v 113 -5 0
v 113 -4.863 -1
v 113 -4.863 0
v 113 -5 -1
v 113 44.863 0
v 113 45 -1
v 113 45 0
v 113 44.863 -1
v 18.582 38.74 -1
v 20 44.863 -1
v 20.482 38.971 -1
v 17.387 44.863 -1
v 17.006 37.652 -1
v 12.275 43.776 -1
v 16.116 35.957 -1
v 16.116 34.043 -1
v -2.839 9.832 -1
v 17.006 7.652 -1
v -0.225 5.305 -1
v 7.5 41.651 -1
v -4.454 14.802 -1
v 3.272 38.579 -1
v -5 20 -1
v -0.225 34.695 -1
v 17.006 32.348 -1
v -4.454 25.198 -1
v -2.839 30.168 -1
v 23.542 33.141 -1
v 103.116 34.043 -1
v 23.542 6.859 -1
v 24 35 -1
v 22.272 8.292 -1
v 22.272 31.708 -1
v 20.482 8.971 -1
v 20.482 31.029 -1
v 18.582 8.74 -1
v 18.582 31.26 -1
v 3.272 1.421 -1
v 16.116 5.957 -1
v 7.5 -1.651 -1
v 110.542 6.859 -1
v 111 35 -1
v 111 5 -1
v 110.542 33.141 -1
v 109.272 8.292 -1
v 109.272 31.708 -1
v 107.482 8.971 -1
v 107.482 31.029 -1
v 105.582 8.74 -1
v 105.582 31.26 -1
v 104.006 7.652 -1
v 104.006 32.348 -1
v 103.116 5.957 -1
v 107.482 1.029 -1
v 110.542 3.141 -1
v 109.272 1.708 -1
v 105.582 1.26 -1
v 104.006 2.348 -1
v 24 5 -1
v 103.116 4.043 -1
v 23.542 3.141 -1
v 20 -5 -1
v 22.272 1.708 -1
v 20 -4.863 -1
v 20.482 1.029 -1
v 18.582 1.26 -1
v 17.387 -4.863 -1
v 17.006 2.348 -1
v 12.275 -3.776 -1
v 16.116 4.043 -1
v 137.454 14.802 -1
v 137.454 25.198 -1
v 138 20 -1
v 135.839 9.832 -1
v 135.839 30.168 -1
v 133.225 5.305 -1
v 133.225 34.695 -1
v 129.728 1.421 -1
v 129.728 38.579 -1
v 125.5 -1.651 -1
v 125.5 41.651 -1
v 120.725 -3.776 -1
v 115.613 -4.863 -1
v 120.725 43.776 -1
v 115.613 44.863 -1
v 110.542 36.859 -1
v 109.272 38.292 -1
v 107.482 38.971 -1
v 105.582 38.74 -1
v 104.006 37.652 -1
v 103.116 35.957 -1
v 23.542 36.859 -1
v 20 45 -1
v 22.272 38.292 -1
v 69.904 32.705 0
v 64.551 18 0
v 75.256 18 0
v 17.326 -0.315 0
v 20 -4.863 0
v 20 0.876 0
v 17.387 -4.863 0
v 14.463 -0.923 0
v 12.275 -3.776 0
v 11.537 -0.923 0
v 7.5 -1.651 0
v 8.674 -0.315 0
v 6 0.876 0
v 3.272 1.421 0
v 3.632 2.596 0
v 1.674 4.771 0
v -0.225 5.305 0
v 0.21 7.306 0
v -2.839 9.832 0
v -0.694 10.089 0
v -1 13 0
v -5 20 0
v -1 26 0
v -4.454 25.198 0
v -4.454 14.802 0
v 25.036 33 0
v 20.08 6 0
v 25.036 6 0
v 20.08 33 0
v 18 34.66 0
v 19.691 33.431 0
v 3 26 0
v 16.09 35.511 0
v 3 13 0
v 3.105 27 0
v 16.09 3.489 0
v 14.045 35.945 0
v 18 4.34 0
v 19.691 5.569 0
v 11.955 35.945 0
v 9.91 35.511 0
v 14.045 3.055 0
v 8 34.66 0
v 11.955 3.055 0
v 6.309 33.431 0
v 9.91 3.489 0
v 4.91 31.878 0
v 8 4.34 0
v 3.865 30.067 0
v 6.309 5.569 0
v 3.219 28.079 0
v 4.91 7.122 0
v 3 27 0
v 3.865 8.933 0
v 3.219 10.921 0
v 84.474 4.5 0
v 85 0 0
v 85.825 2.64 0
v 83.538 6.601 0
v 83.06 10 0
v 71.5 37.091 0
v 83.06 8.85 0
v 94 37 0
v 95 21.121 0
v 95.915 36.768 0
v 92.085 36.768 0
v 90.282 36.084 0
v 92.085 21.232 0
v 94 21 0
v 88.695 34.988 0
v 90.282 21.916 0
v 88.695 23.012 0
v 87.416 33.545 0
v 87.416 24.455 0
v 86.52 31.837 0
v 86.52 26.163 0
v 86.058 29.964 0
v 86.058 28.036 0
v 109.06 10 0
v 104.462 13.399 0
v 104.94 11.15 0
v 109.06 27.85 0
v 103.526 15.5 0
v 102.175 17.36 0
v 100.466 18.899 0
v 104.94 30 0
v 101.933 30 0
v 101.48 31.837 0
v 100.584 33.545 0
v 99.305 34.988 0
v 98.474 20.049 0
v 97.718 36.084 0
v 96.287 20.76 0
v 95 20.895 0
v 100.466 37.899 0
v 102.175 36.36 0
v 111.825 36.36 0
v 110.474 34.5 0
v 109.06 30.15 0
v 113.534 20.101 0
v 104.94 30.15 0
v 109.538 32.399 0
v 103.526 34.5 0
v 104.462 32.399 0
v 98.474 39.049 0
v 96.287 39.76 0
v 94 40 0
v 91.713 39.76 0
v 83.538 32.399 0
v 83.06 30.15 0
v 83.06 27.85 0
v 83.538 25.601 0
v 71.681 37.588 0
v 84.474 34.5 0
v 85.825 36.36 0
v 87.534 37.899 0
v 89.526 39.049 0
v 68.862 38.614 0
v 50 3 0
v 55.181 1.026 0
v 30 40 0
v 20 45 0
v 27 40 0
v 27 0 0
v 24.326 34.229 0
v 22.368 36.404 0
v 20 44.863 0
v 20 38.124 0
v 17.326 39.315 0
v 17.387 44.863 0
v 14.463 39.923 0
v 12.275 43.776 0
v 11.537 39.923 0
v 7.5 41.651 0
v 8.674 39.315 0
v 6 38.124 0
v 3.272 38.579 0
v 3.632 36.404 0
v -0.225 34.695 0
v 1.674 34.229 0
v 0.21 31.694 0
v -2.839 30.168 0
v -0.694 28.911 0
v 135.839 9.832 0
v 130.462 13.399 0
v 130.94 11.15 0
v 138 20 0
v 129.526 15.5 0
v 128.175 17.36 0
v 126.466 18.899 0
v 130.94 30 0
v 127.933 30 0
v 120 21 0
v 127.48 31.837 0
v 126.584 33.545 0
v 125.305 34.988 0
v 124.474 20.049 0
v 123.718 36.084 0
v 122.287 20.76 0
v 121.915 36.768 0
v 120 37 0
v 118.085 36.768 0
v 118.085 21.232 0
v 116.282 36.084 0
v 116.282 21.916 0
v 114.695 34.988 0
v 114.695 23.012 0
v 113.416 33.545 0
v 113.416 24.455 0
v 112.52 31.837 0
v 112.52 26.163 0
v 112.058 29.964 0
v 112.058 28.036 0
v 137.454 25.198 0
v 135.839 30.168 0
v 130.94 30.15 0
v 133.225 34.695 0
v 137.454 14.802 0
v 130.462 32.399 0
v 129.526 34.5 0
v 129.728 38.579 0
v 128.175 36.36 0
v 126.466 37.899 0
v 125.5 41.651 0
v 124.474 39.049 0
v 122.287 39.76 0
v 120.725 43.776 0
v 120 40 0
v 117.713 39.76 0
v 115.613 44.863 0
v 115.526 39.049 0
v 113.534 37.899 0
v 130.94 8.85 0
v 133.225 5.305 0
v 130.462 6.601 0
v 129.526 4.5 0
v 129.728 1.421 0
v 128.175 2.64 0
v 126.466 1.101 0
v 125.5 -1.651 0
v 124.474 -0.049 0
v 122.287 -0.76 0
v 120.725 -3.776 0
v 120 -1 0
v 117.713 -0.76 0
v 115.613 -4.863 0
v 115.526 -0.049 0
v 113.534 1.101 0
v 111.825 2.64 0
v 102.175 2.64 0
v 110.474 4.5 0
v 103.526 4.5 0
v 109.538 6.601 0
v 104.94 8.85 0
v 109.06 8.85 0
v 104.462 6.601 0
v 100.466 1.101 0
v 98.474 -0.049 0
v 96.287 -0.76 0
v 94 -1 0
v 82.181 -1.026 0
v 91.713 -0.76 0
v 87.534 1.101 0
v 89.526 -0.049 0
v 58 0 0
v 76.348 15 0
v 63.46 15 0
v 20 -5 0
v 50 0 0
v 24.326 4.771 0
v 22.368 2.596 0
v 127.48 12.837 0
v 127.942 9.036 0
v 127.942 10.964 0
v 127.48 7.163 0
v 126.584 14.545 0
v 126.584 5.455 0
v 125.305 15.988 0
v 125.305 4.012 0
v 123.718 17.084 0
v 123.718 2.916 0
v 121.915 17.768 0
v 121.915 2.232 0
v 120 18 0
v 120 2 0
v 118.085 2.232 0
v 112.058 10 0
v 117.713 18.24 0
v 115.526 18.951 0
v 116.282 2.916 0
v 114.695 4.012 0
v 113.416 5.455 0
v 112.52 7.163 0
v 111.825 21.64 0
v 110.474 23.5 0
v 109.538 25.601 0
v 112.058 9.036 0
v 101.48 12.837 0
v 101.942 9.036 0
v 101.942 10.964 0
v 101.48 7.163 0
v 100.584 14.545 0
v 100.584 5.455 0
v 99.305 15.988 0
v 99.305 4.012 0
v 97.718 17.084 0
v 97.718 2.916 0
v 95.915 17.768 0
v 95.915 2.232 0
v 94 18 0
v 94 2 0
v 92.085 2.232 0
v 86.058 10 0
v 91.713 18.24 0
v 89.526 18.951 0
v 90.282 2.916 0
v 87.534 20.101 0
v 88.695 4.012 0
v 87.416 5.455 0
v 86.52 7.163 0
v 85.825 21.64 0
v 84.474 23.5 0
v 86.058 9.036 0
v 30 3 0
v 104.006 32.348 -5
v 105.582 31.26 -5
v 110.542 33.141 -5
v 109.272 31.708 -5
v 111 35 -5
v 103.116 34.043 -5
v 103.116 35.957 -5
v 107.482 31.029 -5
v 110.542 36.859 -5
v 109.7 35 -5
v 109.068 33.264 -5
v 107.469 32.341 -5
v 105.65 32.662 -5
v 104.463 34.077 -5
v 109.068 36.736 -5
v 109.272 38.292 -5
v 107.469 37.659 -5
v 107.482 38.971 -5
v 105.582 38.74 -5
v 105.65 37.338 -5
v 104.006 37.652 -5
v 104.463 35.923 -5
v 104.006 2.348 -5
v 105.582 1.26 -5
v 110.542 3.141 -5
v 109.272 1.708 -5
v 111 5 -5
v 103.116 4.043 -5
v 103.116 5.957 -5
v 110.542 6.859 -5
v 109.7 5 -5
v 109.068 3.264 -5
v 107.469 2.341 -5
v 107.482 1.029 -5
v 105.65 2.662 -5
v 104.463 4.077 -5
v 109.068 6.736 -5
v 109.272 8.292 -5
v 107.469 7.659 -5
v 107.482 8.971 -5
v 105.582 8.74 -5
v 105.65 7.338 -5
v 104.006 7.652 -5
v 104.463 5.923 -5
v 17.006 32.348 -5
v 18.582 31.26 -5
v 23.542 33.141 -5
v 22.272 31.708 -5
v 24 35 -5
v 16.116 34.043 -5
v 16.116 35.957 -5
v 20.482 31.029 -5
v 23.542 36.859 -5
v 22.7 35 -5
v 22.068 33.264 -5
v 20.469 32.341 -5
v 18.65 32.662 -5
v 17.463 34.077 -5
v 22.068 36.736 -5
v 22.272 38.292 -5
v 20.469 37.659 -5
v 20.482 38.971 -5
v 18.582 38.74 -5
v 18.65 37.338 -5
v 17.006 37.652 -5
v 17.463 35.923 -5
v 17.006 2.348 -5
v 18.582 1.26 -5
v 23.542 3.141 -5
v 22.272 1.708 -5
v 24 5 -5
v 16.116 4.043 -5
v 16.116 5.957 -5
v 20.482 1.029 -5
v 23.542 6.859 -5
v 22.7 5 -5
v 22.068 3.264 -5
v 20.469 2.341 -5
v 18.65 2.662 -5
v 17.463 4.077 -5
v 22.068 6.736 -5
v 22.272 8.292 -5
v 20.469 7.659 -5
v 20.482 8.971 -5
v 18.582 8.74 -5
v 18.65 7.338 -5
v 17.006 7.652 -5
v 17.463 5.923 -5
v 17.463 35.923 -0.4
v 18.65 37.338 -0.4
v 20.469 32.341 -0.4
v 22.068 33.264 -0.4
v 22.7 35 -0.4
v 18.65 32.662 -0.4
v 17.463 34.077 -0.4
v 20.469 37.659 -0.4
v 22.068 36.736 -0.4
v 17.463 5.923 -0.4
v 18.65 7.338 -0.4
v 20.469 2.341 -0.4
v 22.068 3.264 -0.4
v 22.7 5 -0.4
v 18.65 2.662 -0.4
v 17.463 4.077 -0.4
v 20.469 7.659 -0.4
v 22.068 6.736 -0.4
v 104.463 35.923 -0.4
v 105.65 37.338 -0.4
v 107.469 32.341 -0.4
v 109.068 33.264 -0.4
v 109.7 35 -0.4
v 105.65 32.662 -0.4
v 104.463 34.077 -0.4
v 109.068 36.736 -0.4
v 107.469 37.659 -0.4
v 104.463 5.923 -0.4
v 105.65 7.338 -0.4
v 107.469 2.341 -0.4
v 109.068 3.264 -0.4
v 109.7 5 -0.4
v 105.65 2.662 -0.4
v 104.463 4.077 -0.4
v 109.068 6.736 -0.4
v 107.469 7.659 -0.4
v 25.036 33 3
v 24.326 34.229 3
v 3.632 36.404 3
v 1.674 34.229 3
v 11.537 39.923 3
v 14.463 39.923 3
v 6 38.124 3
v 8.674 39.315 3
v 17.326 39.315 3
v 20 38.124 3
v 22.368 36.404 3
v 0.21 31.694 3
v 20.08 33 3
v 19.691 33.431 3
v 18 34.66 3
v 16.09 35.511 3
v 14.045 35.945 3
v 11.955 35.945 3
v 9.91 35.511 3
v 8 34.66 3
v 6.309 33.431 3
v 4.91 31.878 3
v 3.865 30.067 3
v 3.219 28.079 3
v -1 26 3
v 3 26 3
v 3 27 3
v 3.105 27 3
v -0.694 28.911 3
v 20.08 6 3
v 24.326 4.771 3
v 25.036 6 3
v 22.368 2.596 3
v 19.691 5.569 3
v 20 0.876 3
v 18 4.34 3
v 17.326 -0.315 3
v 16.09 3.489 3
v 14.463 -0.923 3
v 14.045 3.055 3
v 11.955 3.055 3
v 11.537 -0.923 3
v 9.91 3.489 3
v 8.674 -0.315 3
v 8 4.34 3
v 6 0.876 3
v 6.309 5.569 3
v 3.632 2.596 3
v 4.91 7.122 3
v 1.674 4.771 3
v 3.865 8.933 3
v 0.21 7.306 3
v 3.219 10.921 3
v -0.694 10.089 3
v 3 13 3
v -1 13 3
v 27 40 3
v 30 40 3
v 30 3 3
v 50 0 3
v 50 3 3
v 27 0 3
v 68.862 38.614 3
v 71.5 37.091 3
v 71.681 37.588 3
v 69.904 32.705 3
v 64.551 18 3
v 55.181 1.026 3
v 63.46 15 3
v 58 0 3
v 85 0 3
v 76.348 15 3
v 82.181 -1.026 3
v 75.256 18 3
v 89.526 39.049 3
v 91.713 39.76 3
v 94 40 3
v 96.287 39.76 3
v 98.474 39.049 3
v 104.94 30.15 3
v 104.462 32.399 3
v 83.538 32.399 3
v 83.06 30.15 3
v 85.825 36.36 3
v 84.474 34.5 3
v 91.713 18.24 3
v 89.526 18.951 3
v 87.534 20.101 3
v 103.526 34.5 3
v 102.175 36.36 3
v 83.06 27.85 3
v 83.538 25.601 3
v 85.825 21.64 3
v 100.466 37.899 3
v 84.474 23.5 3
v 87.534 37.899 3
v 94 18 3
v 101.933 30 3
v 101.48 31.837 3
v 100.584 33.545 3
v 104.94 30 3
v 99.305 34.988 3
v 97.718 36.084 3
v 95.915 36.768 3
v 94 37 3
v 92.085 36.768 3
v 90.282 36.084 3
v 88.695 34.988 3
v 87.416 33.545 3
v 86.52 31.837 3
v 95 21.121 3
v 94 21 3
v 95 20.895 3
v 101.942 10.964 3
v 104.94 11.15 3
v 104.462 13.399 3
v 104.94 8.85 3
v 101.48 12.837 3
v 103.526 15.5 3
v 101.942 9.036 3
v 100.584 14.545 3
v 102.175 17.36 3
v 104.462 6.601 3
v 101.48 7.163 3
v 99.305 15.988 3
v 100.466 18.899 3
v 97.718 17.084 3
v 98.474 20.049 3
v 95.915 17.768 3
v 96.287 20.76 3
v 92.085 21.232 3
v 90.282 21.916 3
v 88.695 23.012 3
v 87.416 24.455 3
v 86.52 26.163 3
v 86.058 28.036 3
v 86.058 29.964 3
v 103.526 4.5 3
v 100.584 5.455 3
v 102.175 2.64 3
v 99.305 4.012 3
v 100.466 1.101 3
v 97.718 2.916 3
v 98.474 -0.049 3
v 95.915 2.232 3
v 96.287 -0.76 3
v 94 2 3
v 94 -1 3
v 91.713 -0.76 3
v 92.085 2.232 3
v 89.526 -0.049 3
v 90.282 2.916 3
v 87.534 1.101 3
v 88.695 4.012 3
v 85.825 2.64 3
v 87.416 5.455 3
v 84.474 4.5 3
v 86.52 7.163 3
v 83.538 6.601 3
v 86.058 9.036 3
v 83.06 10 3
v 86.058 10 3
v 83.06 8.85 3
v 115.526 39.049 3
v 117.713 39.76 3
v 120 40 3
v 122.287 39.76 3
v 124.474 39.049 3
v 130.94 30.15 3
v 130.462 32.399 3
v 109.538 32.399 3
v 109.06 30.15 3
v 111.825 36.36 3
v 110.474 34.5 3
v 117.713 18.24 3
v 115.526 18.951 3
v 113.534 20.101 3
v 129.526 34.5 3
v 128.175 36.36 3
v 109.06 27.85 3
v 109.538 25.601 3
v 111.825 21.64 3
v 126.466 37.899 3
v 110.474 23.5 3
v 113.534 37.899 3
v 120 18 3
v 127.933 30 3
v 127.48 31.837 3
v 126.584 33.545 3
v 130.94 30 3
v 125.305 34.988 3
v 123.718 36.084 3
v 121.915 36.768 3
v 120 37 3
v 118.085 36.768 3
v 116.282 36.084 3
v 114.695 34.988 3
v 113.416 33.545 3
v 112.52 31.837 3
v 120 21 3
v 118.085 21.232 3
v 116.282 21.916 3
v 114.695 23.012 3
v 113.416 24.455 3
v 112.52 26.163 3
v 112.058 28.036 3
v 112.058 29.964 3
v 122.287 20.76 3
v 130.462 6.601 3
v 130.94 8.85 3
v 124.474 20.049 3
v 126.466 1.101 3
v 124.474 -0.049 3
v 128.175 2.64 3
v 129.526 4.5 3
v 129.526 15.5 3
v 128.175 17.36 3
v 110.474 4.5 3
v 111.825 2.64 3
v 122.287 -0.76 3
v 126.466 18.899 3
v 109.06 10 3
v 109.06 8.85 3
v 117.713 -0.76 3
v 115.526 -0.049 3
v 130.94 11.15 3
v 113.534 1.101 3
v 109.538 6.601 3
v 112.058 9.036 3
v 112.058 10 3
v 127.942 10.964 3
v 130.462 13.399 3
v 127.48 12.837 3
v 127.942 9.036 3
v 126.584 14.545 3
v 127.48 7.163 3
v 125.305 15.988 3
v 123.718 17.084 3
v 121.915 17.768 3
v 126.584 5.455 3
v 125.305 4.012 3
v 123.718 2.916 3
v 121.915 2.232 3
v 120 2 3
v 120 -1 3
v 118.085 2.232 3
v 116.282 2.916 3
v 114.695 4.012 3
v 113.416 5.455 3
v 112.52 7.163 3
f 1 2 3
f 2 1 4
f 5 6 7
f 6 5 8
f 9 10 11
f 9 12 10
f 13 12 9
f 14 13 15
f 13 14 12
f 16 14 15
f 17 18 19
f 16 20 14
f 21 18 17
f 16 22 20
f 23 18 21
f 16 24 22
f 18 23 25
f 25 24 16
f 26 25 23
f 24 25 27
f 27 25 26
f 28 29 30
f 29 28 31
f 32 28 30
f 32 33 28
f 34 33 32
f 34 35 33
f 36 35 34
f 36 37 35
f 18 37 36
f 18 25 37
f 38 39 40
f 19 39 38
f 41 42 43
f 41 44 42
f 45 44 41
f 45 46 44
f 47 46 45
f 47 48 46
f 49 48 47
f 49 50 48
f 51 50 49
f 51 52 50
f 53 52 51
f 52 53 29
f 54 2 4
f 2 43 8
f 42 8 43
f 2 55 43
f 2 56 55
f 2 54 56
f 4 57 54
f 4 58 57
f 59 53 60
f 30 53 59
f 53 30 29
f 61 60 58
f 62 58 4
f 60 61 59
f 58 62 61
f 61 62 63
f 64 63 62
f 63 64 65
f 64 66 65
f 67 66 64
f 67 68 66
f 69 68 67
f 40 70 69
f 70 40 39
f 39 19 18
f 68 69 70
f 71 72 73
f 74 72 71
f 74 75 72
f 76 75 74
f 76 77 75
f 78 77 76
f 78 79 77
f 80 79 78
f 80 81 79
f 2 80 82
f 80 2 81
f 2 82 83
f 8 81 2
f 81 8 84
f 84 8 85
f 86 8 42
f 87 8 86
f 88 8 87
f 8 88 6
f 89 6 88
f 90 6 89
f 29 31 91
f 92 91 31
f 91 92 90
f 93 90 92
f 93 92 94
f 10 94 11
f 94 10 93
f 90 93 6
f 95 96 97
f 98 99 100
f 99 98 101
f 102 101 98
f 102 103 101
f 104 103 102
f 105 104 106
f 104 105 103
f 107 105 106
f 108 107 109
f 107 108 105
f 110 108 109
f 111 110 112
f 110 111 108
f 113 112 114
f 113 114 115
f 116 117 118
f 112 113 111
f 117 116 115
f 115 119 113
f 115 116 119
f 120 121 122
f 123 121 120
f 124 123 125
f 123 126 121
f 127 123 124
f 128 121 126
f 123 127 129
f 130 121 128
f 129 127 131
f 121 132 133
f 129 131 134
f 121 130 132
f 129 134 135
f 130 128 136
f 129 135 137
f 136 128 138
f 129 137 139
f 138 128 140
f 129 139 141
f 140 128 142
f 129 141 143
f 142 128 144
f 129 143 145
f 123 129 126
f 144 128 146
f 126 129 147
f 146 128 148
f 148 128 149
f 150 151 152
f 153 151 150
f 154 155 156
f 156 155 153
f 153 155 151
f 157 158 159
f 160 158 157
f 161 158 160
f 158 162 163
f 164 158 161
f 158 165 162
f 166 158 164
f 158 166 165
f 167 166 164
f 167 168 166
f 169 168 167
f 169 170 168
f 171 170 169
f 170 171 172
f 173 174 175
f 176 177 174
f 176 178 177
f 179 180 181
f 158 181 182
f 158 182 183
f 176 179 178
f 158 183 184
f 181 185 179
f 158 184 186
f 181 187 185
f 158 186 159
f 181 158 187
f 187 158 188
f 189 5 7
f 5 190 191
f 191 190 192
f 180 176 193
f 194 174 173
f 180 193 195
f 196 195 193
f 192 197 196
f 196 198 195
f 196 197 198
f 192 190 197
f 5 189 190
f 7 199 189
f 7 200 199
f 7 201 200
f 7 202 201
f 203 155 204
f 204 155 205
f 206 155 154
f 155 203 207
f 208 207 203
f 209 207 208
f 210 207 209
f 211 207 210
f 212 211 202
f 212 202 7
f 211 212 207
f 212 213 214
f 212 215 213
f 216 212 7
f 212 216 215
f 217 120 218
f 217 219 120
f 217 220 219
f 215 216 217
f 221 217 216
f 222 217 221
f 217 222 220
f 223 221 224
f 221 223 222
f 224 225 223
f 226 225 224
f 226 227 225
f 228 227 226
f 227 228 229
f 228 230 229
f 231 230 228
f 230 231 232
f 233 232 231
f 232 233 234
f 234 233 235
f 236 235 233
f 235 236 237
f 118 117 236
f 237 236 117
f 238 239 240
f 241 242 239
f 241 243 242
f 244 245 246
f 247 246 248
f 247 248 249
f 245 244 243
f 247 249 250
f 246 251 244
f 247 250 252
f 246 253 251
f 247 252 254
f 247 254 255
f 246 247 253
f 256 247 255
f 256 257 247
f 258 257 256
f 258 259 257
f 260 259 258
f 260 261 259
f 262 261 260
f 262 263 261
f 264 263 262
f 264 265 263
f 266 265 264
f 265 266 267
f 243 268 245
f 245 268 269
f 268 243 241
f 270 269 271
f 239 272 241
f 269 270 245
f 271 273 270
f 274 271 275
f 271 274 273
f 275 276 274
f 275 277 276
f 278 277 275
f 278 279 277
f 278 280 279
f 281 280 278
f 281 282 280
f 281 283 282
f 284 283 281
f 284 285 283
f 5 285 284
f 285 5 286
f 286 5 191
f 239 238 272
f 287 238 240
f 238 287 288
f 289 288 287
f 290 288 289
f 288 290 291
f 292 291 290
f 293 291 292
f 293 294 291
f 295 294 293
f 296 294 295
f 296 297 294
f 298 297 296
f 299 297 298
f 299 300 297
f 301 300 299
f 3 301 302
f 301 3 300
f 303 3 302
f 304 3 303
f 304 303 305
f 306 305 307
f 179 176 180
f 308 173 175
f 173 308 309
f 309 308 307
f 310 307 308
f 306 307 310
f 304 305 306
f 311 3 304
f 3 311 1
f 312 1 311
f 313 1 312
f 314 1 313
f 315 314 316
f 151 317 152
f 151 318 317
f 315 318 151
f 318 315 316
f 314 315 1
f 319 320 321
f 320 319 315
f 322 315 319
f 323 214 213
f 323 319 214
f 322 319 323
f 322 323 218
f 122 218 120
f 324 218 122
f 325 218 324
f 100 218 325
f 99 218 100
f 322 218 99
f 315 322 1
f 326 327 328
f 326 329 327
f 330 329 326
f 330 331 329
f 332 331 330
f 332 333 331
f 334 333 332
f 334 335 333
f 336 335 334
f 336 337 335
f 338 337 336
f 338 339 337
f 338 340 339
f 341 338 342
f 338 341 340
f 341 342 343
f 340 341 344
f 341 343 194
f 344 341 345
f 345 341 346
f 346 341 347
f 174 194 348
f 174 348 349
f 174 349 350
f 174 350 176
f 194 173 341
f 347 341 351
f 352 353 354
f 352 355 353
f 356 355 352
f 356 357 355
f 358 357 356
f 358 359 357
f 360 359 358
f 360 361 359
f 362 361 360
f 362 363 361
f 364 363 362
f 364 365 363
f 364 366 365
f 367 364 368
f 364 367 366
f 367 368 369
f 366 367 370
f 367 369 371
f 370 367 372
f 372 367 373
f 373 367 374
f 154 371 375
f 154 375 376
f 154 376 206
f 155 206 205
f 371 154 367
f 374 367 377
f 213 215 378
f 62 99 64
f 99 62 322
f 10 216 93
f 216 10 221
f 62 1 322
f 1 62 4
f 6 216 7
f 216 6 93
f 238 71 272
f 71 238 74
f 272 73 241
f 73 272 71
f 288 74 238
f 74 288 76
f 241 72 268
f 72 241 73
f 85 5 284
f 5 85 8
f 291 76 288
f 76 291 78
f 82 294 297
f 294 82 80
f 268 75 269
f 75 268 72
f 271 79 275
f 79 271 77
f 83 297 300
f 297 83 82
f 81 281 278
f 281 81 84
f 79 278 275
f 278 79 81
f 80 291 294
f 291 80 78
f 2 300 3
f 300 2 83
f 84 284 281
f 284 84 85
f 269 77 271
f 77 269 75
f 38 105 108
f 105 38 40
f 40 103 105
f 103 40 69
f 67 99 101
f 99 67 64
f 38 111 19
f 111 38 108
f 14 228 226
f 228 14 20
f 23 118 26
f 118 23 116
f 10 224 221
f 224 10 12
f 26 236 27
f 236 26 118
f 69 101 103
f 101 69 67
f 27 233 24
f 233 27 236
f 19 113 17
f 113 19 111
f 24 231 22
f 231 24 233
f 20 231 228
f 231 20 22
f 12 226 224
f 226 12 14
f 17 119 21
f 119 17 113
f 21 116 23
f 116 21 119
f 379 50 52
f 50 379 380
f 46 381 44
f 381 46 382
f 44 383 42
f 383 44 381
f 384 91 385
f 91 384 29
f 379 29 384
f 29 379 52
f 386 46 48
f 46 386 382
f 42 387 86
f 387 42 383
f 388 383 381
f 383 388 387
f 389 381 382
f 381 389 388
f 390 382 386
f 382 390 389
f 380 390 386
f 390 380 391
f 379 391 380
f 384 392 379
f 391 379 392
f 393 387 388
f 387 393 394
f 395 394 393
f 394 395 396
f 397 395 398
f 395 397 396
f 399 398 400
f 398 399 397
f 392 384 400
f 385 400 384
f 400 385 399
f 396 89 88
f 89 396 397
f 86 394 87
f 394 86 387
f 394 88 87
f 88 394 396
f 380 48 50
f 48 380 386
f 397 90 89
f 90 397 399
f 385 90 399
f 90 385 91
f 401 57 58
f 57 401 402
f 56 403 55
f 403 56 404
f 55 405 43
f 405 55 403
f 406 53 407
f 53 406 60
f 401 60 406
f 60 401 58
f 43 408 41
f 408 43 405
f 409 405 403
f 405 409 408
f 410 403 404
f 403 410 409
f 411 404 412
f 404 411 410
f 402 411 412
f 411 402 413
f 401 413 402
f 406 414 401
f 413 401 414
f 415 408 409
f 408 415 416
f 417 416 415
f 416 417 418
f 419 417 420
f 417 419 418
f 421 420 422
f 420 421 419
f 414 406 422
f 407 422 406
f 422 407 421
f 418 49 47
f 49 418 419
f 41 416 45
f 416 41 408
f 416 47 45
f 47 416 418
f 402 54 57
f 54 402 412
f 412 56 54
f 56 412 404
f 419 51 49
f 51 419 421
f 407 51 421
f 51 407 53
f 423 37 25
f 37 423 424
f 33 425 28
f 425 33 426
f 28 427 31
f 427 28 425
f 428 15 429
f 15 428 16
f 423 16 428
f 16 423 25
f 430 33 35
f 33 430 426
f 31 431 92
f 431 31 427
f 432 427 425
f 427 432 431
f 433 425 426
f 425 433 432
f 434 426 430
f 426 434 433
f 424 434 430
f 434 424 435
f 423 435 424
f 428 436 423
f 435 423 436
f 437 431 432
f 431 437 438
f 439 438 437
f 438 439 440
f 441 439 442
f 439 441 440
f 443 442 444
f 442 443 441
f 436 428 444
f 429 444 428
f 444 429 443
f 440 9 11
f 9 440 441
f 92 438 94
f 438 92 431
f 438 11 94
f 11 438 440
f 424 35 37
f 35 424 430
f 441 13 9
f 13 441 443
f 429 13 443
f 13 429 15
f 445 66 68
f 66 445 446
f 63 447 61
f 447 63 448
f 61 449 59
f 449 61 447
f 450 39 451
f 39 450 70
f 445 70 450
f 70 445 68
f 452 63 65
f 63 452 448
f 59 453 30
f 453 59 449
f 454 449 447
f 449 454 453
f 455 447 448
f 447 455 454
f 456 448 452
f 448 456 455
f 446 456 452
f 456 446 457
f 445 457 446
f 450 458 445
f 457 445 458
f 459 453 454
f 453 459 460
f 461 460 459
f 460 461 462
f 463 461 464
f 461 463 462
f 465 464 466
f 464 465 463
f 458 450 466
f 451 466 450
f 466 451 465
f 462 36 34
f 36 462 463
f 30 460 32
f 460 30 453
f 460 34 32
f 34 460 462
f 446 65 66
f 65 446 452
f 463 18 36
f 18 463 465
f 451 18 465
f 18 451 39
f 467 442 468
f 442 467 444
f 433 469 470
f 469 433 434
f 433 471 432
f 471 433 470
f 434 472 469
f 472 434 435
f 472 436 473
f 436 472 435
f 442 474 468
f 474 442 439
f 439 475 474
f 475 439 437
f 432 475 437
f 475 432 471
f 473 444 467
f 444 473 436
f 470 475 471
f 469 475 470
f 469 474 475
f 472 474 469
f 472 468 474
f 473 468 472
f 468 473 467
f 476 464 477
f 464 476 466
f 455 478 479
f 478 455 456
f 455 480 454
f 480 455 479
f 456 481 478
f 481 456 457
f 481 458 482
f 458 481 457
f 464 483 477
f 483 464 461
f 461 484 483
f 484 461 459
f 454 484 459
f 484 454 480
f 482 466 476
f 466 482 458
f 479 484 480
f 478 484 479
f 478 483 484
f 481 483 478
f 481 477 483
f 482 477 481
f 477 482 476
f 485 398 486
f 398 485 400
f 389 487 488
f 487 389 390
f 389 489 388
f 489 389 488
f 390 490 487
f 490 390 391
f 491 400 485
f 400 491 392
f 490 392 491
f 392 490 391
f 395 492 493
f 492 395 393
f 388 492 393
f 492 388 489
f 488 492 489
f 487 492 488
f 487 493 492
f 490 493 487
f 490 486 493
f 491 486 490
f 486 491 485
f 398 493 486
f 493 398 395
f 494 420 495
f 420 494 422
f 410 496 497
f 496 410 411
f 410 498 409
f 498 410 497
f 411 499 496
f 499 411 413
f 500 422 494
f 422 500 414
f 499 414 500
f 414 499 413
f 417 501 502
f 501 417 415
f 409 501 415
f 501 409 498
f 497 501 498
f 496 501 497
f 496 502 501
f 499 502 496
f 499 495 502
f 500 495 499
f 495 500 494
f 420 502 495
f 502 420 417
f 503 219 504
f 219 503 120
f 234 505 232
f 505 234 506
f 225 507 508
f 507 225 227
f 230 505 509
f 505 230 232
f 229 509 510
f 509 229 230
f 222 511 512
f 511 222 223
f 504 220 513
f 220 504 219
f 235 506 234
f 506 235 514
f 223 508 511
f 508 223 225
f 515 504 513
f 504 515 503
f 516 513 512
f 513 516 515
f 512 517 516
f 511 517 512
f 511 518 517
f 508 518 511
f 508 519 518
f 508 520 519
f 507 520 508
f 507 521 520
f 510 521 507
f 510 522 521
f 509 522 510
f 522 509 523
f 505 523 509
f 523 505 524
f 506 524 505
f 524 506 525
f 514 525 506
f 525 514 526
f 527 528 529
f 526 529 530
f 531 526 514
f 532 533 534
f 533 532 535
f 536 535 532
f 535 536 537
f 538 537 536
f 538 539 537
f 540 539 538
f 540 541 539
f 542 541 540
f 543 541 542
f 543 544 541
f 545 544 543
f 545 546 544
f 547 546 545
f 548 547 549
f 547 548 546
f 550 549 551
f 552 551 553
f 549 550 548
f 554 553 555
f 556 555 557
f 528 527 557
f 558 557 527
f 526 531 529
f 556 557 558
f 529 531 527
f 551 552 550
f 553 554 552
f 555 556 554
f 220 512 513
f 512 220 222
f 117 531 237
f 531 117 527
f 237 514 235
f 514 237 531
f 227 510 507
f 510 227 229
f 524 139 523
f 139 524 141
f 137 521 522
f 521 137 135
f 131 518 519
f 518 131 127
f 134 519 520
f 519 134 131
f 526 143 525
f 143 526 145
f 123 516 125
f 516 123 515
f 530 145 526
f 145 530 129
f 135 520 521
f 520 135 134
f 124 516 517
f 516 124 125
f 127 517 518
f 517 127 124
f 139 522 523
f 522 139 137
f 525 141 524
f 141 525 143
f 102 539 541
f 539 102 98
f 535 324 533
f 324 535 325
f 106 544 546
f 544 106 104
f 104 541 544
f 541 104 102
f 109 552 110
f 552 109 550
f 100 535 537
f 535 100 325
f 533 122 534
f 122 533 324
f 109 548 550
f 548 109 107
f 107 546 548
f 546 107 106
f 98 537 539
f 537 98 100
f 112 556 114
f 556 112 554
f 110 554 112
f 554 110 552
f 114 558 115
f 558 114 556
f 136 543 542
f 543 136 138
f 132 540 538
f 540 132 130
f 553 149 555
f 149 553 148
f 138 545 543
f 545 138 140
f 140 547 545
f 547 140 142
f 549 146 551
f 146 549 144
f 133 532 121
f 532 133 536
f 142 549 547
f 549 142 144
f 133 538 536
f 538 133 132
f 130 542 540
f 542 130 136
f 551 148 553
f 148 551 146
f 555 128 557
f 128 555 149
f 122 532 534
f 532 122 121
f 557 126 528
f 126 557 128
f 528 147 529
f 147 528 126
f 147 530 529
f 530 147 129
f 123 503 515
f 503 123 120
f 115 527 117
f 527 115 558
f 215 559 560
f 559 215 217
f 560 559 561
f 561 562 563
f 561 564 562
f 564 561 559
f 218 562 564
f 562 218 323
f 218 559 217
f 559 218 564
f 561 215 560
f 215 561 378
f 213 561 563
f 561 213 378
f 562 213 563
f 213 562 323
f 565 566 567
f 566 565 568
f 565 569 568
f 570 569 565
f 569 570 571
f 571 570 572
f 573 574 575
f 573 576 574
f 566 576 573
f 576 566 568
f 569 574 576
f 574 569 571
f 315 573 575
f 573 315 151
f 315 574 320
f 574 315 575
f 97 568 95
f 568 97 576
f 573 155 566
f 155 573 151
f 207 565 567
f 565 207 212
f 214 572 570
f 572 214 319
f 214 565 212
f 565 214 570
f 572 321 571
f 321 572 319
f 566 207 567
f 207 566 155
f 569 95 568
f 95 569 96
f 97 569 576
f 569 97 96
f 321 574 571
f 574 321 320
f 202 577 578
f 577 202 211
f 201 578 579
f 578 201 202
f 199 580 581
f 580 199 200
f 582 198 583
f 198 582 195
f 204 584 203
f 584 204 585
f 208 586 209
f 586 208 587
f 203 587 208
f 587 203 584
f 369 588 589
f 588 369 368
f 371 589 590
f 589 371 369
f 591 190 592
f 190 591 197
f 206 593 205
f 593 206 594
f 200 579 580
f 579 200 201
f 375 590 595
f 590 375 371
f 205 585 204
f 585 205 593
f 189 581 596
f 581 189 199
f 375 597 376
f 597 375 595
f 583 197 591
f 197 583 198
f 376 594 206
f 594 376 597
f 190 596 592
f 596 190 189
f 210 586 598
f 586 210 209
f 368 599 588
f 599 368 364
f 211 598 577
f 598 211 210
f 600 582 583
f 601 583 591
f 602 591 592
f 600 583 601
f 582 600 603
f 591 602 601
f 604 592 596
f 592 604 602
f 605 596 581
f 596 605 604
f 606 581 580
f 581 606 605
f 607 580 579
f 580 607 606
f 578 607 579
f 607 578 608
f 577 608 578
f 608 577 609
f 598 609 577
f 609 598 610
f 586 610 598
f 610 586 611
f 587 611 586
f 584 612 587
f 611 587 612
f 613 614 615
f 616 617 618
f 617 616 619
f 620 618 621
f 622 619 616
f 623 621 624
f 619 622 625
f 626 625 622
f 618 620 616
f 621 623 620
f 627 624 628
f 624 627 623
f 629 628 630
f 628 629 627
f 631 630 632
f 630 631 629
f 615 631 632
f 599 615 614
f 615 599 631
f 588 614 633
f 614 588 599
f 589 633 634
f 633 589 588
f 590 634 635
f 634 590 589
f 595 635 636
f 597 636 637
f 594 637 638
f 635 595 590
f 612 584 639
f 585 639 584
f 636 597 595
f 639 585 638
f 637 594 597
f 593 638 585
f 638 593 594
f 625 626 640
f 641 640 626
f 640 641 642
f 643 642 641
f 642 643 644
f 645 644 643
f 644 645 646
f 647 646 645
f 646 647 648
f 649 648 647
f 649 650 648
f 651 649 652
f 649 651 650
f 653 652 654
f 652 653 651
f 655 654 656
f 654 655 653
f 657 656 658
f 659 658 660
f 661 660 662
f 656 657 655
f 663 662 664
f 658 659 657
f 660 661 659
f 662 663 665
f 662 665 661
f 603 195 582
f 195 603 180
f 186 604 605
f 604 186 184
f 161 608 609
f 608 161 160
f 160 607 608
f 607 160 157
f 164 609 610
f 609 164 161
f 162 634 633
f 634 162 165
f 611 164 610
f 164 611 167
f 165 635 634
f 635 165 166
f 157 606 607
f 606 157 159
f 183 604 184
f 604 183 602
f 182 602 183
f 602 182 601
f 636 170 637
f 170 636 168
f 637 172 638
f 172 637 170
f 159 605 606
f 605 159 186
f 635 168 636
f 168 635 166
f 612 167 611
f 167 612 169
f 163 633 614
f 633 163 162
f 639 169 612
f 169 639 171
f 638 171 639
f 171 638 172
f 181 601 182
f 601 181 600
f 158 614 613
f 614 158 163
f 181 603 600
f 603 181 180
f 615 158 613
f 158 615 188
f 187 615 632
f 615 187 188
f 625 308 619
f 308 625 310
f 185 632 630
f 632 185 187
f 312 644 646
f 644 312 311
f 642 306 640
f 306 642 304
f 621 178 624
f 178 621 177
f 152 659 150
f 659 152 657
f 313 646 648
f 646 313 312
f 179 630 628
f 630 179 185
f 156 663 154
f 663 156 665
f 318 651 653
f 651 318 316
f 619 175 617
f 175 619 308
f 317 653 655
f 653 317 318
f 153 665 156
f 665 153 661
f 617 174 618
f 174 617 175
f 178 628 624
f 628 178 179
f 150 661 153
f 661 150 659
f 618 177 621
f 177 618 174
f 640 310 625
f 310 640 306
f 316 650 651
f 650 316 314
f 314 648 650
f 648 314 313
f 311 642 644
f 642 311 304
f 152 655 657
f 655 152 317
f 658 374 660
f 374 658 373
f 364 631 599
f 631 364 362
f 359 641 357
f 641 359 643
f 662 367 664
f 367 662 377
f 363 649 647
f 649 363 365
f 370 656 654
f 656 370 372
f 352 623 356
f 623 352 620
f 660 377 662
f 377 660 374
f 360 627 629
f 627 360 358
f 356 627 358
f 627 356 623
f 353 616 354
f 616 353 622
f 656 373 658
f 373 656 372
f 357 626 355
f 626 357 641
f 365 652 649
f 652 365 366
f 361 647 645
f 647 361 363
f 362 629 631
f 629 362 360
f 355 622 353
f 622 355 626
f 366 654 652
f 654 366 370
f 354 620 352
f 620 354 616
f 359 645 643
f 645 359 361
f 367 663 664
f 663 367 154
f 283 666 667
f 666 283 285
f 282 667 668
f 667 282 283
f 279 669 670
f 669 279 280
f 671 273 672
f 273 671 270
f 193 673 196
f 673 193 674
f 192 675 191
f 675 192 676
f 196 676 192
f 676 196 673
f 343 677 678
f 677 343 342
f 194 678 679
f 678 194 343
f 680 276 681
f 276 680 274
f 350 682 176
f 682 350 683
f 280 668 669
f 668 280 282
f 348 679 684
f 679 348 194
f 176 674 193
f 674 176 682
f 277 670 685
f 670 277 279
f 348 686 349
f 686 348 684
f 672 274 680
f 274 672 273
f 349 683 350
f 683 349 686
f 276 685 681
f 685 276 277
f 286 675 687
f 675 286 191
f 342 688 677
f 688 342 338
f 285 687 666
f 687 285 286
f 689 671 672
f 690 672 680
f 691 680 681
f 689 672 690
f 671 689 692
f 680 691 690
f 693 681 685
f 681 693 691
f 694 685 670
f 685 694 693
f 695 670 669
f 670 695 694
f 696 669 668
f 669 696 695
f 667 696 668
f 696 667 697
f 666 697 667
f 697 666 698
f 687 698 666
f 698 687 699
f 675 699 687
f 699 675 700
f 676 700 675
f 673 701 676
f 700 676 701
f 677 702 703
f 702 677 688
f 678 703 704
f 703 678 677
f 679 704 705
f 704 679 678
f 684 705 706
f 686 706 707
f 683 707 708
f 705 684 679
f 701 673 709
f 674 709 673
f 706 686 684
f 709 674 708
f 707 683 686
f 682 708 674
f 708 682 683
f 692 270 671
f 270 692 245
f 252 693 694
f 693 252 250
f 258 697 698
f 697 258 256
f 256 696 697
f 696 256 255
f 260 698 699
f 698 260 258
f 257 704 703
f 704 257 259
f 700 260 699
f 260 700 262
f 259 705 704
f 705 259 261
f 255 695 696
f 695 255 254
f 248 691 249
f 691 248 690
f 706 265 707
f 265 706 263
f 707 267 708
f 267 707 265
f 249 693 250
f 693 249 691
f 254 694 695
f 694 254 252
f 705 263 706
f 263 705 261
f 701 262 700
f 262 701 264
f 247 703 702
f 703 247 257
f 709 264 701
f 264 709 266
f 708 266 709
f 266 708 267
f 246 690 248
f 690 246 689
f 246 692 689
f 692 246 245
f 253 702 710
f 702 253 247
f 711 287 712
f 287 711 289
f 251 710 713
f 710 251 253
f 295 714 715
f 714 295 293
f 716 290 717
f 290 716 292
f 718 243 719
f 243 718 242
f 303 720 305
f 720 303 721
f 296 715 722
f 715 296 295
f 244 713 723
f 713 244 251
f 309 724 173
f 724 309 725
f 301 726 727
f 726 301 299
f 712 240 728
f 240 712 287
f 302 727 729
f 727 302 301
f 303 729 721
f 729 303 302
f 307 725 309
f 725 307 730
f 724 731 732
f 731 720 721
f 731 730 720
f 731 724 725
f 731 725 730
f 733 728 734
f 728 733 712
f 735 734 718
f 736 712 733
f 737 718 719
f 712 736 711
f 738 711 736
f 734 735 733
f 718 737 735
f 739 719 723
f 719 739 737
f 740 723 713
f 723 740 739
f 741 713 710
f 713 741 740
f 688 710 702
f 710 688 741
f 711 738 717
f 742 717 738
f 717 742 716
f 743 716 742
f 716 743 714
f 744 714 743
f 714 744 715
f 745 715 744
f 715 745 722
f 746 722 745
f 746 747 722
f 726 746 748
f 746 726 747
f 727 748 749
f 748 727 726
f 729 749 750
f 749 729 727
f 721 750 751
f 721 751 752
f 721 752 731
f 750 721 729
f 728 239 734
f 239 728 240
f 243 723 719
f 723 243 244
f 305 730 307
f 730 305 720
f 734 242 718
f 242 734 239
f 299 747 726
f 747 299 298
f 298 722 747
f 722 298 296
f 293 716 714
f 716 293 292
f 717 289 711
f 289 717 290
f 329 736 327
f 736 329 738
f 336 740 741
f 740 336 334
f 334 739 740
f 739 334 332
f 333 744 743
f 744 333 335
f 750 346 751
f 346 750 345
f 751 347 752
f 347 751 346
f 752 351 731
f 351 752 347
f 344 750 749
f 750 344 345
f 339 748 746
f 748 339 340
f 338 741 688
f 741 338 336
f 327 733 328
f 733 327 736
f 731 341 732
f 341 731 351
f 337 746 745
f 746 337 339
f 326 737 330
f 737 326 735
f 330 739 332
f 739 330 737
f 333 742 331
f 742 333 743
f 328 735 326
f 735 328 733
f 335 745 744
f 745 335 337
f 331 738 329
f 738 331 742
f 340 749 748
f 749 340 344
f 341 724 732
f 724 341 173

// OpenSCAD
union(){
 rotate([0,900,180]) translate([20,-45,0])
difference(){  
 union(){  
  cube([93,50,1]);
   translate([93,25,0]) cylinder(1,25,25);
    translate([0,25,0]) cylinder(1,25,25);
  
  translate([87,10,0]) cylinder(5,4,4);
  translate([87,40,0]) cylinder(5,4,4);
  translate([0,10,0]) cylinder(5,4,4);
  translate([0,40,0]) cylinder(5,4,4);
}
  

  #translate([0,10,0.4]) cylinder(5,2.7,2.7);
  #translate([0,40,0.4]) cylinder(5,2.7,2.7);
  




  #translate([87,10,0.4]) cylinder(5,2.7,2.7);
  #translate([87,40,0.4]) cylinder(5,2.7,2.7);

  }


}

//С

translate([-27,0,0])
union(){

translate([26,13,0]) cube([4,13,3]);
difference(){
union(){
	
  difference(){
  translate([40,26,0]) cylinder(3,14,14);
  translate([40,26,-1]) cylinder(5,10,10);
  translate([33,12,-1]) cube([20,20,5]);

}

difference(){
  translate([40,13,0]) cylinder(3,14,14);
  translate([40,13,-1]) cylinder(5,10,10);
  translate([32,15,-1]) cube([19,13,5]);
  translate([40,6,-1]) cube(20);
}
}
  translate([30,13,-1]) cube([5,14,5]);
  translate([42,13,-1]) cube(20);
}
}
translate([5,20,0]){
rotate([0,0,90]){
union(){
//буква L
  translate([-20,-25,0]) cube([40,3,3]);
  translate([-20,-45,0]) cube([3,20,3]);
//буква А
 translate([-20,-80,0])
  rotate(20,0,0)
   cube([40,3,3]);
 
 translate([-20,-53,0])
  rotate(-20,0,0)
   cube([40,3,3]);

  translate([-5,-73,0]) cube([3,16,3]);
}
}
}
//буква S
translate([0,20,0]){
rotate([0,0,90]){

difference(){
  translate([9,-94,0]) cylinder(3,11,11);
  translate([9,-94,-1]) cylinder(5,8,8);
  translate([-5,-110,-1]) cube(15);

}

difference(){
  translate([-10,-94,0]) cylinder(3,11,11);
  translate([-10,-94,-1]) cylinder(5,8,8);
  translate([-10,-94,-1]) cube(15);

}
difference(){
  translate([9,-120,0]) cylinder(3,11,11);
  translate([9,-120,-1]) cylinder(5,8,8);
  translate([-5,-135,-1]) cube(15);

}

difference(){
  translate([-10,-120,0]) cylinder(3,11,11);
  translate([-10,-120,-1]) cylinder(5,8,8);
  translate([-10,-120,-1]) cube(15);

}
}
}
